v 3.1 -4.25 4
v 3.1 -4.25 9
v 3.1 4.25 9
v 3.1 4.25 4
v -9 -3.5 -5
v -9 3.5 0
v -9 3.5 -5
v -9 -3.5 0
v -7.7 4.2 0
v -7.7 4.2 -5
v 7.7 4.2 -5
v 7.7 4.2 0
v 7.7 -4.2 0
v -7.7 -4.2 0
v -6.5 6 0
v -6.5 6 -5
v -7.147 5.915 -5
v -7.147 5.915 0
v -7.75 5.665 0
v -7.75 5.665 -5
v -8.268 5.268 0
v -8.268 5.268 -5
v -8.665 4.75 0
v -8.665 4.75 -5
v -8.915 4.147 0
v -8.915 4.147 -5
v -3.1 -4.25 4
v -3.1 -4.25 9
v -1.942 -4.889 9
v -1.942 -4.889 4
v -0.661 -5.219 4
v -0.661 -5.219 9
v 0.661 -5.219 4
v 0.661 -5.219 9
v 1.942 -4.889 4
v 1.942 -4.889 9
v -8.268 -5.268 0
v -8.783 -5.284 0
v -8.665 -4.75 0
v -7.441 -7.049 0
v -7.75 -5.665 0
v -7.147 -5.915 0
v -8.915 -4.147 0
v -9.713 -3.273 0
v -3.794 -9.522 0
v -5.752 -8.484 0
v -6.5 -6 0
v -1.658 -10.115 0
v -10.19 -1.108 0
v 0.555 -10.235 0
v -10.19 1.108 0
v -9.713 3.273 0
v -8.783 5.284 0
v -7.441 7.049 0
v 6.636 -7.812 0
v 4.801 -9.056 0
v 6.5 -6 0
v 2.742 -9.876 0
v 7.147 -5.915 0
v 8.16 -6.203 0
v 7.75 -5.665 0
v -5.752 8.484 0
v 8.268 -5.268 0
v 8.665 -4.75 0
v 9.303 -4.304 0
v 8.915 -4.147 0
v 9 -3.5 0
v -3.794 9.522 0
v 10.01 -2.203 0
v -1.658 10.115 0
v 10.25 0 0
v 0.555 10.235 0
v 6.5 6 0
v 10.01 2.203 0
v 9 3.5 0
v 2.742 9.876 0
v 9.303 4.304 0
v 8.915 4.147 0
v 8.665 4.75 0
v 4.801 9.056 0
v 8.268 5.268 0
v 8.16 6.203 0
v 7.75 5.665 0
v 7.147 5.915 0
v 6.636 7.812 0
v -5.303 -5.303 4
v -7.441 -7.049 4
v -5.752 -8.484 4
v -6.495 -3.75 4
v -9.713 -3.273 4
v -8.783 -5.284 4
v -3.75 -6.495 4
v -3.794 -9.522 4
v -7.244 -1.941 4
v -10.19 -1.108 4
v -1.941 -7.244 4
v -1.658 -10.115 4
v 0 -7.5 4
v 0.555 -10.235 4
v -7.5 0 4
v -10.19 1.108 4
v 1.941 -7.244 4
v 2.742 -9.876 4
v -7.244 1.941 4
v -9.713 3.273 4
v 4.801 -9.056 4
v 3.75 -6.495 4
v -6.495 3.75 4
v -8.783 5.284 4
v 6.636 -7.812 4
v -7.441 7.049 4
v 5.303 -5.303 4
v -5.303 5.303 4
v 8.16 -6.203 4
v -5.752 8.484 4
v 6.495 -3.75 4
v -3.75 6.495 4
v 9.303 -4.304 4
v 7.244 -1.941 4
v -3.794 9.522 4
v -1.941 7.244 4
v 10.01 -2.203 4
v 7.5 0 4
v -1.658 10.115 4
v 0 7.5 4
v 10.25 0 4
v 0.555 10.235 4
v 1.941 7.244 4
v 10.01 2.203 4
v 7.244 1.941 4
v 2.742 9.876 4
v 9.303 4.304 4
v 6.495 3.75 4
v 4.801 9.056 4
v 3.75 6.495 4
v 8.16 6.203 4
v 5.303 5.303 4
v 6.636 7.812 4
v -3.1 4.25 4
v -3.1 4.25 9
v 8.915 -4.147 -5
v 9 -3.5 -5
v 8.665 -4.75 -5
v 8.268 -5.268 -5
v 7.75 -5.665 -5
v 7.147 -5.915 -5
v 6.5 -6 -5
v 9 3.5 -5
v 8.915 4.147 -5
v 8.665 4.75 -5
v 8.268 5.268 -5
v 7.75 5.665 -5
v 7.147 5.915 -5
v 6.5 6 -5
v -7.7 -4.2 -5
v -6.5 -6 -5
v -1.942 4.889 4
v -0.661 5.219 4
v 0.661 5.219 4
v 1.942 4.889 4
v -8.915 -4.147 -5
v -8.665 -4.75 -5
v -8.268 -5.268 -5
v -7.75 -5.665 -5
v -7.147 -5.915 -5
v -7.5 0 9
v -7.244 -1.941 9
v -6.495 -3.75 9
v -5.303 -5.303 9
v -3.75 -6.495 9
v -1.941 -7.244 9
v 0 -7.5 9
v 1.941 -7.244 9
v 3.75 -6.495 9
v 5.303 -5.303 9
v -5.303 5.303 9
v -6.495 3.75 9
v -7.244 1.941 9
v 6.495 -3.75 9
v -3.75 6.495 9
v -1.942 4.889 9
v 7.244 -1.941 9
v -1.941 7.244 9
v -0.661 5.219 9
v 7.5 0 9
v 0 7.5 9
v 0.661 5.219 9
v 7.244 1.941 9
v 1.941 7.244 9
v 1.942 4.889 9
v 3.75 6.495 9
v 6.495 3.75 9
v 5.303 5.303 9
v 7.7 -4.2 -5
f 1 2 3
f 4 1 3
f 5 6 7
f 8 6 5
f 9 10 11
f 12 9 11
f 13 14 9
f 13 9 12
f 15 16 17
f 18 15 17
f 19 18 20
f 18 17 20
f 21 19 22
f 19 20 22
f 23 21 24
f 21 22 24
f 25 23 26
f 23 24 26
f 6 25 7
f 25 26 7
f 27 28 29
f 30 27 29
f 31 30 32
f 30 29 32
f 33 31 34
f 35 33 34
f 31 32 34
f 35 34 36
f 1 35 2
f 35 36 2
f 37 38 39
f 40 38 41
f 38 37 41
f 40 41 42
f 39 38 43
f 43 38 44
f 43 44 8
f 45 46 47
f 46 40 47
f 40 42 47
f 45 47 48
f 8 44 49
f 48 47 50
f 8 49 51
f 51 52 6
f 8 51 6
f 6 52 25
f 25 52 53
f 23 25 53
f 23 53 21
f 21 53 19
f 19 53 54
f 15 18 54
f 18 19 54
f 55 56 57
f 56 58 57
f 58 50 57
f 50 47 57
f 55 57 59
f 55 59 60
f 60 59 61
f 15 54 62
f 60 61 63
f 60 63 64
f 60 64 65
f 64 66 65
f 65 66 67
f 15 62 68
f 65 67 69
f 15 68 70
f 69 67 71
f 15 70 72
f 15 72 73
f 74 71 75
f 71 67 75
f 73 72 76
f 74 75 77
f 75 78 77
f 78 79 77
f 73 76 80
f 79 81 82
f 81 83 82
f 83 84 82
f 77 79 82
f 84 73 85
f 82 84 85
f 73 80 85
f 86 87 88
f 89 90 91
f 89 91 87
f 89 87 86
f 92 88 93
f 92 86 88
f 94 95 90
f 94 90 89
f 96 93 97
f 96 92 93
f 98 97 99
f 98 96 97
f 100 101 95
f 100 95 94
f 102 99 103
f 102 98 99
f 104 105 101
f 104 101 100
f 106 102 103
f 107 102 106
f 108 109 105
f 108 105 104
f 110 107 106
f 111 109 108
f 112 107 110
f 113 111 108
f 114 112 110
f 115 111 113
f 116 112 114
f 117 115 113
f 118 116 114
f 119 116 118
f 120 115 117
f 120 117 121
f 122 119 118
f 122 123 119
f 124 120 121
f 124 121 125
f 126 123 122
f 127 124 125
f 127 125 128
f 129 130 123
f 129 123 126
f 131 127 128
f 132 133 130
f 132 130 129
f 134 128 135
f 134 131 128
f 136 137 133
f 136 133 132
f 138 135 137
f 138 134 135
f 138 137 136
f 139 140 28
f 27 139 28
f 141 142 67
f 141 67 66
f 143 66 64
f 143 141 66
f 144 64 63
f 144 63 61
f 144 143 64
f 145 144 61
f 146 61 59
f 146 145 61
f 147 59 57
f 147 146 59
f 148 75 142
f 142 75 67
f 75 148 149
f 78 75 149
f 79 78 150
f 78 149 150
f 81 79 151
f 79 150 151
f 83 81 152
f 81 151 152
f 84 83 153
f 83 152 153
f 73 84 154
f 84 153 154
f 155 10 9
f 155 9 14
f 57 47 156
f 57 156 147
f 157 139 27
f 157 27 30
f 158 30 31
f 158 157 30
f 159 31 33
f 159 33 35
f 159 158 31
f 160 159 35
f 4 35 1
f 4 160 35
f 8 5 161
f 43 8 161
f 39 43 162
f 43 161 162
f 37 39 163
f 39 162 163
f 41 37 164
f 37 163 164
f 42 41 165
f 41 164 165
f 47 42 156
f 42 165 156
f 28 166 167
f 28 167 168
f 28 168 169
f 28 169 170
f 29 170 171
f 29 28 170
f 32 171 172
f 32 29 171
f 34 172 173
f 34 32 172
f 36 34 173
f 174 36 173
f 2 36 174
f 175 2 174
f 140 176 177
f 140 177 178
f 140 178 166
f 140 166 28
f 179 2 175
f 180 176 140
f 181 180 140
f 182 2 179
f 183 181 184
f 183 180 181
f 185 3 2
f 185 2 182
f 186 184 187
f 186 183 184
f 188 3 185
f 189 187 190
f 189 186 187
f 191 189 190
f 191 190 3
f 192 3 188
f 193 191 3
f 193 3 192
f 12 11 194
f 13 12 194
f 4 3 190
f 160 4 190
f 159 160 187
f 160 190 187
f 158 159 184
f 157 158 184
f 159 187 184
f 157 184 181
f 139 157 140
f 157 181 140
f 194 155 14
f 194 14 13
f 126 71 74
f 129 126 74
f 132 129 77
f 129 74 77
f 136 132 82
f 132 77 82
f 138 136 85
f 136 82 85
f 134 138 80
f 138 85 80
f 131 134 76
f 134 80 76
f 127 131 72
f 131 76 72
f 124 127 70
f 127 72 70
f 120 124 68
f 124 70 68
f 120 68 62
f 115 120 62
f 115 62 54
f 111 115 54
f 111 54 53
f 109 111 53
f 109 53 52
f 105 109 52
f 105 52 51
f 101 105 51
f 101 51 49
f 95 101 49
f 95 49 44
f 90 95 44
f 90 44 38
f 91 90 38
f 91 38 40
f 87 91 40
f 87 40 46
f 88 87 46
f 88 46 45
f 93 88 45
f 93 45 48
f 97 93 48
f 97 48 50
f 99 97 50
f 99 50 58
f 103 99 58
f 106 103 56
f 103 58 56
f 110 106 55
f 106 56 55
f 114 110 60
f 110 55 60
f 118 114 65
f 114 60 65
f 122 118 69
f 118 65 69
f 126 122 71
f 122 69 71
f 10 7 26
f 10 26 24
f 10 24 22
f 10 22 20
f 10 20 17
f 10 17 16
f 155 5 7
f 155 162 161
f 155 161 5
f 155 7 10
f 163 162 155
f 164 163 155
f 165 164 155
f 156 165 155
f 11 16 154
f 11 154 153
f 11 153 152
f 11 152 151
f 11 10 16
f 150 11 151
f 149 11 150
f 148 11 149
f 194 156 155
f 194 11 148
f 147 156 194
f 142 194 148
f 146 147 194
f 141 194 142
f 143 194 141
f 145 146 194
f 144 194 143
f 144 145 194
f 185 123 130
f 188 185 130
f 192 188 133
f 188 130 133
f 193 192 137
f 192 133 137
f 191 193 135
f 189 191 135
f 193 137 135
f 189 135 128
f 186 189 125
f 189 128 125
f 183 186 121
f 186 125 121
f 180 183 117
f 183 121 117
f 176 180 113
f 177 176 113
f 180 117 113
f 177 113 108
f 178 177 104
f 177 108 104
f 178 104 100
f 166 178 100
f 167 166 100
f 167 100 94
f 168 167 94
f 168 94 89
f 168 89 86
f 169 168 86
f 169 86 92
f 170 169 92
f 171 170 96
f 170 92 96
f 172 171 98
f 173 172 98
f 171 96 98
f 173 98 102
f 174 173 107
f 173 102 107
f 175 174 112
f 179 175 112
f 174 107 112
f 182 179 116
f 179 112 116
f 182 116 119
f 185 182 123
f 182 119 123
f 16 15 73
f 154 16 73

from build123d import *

# Parameters (mm, degrees)
F0_R         = 10.25
F1_DEPTH     = 4
F2_W         = 18
F2_H         = 12
F3_DEPTH     = 5
F4_W         = 15.4
F4_H         = 8.4
F5_DEPTH     = 5
F6_R         = 7.5
F7_DEPTH     = 5
F9_DEPTH     = 5
F10_T1_DEPTH = 11.25


# Not quite as in the source:
# - a fillet or chamfer that OpenCascade refuses, or shapes differently, is made with other operations: its cross-section is extruded or revolved along the edge and cut away or added


with BuildPart() as f1:
    # F0 (on Top) → F1 (new body)
    with BuildSketch(Plane.XY):
        Circle(F0_R)
    extrude(amount=F1_DEPTH)

    # F2 (on face) → F3 (join)
    with BuildSketch(Plane(origin=(0, 0, 0), x_dir=(1, 0, 0), z_dir=(0, 0, -1))):
        Rectangle(F2_W, F2_H)
    extrude(amount=F3_DEPTH)

    # F4 (on face) → F5 (cut)
    with BuildSketch(Plane(origin=(0, 0, -5), x_dir=(1, 0, 0), z_dir=(0, 0, -1))):
        Rectangle(F4_W, F4_H)
    extrude(amount=-F5_DEPTH, mode=Mode.SUBTRACT)

    # F6 (on face) → F7 (join)
    with BuildSketch(Plane.XY.offset(4)):
        Circle(F6_R)
    extrude(amount=F7_DEPTH)

    # F8 (on face) → F9 (cut)
    with BuildSketch(Plane.XY.offset(9)):
        with BuildLine():
            ThreePointArc((3.1, 4.25), (0, 5.2604657588), (-3.1, 4.25))
            Line((-3.1, 4.25), (-3.1, -4.25))
            ThreePointArc((-3.1, -4.25), (0, -5.2604657588), (3.1, -4.25))
            Line((3.1, -4.25), (3.1, 4.25))
        make_face()
    extrude(amount=-F9_DEPTH, mode=Mode.SUBTRACT)

    # F10: fillet of radius 2.5 on 4 edges, made by hand

    # F10_s2 → F10_t1 (cut)
    with BuildSketch(Plane.XY.offset(-11.25)):
        with BuildLine():
            ThreePointArc((-6.5, 6), (-8.267766953, 5.267766953), (-9, 3.5))
            Line((-9, 3.5), (-9, 6))
            Line((-9, 6), (-6.5, 6))
        make_face()
        with BuildLine():
            ThreePointArc((-9, -3.5), (-8.267766953, -5.267766953), (-6.5, -6))
            Line((-6.5, -6), (-9, -6))
            Line((-9, -6), (-9, -3.5))
        make_face()
        with BuildLine():
            ThreePointArc((9, -3.5), (8.267766953, -5.267766953), (6.5, -6))
            Line((6.5, -6), (9, -6))
            Line((9, -6), (9, -3.5))
        make_face()
        with BuildLine():
            ThreePointArc((9, 3.5), (8.267766953, 5.267766953), (6.5, 6))
            Line((6.5, 6), (9, 6))
            Line((9, 6), (9, 3.5))
        make_face()
    extrude(amount=F10_T1_DEPTH, mode=Mode.SUBTRACT)


solid = f1.part
